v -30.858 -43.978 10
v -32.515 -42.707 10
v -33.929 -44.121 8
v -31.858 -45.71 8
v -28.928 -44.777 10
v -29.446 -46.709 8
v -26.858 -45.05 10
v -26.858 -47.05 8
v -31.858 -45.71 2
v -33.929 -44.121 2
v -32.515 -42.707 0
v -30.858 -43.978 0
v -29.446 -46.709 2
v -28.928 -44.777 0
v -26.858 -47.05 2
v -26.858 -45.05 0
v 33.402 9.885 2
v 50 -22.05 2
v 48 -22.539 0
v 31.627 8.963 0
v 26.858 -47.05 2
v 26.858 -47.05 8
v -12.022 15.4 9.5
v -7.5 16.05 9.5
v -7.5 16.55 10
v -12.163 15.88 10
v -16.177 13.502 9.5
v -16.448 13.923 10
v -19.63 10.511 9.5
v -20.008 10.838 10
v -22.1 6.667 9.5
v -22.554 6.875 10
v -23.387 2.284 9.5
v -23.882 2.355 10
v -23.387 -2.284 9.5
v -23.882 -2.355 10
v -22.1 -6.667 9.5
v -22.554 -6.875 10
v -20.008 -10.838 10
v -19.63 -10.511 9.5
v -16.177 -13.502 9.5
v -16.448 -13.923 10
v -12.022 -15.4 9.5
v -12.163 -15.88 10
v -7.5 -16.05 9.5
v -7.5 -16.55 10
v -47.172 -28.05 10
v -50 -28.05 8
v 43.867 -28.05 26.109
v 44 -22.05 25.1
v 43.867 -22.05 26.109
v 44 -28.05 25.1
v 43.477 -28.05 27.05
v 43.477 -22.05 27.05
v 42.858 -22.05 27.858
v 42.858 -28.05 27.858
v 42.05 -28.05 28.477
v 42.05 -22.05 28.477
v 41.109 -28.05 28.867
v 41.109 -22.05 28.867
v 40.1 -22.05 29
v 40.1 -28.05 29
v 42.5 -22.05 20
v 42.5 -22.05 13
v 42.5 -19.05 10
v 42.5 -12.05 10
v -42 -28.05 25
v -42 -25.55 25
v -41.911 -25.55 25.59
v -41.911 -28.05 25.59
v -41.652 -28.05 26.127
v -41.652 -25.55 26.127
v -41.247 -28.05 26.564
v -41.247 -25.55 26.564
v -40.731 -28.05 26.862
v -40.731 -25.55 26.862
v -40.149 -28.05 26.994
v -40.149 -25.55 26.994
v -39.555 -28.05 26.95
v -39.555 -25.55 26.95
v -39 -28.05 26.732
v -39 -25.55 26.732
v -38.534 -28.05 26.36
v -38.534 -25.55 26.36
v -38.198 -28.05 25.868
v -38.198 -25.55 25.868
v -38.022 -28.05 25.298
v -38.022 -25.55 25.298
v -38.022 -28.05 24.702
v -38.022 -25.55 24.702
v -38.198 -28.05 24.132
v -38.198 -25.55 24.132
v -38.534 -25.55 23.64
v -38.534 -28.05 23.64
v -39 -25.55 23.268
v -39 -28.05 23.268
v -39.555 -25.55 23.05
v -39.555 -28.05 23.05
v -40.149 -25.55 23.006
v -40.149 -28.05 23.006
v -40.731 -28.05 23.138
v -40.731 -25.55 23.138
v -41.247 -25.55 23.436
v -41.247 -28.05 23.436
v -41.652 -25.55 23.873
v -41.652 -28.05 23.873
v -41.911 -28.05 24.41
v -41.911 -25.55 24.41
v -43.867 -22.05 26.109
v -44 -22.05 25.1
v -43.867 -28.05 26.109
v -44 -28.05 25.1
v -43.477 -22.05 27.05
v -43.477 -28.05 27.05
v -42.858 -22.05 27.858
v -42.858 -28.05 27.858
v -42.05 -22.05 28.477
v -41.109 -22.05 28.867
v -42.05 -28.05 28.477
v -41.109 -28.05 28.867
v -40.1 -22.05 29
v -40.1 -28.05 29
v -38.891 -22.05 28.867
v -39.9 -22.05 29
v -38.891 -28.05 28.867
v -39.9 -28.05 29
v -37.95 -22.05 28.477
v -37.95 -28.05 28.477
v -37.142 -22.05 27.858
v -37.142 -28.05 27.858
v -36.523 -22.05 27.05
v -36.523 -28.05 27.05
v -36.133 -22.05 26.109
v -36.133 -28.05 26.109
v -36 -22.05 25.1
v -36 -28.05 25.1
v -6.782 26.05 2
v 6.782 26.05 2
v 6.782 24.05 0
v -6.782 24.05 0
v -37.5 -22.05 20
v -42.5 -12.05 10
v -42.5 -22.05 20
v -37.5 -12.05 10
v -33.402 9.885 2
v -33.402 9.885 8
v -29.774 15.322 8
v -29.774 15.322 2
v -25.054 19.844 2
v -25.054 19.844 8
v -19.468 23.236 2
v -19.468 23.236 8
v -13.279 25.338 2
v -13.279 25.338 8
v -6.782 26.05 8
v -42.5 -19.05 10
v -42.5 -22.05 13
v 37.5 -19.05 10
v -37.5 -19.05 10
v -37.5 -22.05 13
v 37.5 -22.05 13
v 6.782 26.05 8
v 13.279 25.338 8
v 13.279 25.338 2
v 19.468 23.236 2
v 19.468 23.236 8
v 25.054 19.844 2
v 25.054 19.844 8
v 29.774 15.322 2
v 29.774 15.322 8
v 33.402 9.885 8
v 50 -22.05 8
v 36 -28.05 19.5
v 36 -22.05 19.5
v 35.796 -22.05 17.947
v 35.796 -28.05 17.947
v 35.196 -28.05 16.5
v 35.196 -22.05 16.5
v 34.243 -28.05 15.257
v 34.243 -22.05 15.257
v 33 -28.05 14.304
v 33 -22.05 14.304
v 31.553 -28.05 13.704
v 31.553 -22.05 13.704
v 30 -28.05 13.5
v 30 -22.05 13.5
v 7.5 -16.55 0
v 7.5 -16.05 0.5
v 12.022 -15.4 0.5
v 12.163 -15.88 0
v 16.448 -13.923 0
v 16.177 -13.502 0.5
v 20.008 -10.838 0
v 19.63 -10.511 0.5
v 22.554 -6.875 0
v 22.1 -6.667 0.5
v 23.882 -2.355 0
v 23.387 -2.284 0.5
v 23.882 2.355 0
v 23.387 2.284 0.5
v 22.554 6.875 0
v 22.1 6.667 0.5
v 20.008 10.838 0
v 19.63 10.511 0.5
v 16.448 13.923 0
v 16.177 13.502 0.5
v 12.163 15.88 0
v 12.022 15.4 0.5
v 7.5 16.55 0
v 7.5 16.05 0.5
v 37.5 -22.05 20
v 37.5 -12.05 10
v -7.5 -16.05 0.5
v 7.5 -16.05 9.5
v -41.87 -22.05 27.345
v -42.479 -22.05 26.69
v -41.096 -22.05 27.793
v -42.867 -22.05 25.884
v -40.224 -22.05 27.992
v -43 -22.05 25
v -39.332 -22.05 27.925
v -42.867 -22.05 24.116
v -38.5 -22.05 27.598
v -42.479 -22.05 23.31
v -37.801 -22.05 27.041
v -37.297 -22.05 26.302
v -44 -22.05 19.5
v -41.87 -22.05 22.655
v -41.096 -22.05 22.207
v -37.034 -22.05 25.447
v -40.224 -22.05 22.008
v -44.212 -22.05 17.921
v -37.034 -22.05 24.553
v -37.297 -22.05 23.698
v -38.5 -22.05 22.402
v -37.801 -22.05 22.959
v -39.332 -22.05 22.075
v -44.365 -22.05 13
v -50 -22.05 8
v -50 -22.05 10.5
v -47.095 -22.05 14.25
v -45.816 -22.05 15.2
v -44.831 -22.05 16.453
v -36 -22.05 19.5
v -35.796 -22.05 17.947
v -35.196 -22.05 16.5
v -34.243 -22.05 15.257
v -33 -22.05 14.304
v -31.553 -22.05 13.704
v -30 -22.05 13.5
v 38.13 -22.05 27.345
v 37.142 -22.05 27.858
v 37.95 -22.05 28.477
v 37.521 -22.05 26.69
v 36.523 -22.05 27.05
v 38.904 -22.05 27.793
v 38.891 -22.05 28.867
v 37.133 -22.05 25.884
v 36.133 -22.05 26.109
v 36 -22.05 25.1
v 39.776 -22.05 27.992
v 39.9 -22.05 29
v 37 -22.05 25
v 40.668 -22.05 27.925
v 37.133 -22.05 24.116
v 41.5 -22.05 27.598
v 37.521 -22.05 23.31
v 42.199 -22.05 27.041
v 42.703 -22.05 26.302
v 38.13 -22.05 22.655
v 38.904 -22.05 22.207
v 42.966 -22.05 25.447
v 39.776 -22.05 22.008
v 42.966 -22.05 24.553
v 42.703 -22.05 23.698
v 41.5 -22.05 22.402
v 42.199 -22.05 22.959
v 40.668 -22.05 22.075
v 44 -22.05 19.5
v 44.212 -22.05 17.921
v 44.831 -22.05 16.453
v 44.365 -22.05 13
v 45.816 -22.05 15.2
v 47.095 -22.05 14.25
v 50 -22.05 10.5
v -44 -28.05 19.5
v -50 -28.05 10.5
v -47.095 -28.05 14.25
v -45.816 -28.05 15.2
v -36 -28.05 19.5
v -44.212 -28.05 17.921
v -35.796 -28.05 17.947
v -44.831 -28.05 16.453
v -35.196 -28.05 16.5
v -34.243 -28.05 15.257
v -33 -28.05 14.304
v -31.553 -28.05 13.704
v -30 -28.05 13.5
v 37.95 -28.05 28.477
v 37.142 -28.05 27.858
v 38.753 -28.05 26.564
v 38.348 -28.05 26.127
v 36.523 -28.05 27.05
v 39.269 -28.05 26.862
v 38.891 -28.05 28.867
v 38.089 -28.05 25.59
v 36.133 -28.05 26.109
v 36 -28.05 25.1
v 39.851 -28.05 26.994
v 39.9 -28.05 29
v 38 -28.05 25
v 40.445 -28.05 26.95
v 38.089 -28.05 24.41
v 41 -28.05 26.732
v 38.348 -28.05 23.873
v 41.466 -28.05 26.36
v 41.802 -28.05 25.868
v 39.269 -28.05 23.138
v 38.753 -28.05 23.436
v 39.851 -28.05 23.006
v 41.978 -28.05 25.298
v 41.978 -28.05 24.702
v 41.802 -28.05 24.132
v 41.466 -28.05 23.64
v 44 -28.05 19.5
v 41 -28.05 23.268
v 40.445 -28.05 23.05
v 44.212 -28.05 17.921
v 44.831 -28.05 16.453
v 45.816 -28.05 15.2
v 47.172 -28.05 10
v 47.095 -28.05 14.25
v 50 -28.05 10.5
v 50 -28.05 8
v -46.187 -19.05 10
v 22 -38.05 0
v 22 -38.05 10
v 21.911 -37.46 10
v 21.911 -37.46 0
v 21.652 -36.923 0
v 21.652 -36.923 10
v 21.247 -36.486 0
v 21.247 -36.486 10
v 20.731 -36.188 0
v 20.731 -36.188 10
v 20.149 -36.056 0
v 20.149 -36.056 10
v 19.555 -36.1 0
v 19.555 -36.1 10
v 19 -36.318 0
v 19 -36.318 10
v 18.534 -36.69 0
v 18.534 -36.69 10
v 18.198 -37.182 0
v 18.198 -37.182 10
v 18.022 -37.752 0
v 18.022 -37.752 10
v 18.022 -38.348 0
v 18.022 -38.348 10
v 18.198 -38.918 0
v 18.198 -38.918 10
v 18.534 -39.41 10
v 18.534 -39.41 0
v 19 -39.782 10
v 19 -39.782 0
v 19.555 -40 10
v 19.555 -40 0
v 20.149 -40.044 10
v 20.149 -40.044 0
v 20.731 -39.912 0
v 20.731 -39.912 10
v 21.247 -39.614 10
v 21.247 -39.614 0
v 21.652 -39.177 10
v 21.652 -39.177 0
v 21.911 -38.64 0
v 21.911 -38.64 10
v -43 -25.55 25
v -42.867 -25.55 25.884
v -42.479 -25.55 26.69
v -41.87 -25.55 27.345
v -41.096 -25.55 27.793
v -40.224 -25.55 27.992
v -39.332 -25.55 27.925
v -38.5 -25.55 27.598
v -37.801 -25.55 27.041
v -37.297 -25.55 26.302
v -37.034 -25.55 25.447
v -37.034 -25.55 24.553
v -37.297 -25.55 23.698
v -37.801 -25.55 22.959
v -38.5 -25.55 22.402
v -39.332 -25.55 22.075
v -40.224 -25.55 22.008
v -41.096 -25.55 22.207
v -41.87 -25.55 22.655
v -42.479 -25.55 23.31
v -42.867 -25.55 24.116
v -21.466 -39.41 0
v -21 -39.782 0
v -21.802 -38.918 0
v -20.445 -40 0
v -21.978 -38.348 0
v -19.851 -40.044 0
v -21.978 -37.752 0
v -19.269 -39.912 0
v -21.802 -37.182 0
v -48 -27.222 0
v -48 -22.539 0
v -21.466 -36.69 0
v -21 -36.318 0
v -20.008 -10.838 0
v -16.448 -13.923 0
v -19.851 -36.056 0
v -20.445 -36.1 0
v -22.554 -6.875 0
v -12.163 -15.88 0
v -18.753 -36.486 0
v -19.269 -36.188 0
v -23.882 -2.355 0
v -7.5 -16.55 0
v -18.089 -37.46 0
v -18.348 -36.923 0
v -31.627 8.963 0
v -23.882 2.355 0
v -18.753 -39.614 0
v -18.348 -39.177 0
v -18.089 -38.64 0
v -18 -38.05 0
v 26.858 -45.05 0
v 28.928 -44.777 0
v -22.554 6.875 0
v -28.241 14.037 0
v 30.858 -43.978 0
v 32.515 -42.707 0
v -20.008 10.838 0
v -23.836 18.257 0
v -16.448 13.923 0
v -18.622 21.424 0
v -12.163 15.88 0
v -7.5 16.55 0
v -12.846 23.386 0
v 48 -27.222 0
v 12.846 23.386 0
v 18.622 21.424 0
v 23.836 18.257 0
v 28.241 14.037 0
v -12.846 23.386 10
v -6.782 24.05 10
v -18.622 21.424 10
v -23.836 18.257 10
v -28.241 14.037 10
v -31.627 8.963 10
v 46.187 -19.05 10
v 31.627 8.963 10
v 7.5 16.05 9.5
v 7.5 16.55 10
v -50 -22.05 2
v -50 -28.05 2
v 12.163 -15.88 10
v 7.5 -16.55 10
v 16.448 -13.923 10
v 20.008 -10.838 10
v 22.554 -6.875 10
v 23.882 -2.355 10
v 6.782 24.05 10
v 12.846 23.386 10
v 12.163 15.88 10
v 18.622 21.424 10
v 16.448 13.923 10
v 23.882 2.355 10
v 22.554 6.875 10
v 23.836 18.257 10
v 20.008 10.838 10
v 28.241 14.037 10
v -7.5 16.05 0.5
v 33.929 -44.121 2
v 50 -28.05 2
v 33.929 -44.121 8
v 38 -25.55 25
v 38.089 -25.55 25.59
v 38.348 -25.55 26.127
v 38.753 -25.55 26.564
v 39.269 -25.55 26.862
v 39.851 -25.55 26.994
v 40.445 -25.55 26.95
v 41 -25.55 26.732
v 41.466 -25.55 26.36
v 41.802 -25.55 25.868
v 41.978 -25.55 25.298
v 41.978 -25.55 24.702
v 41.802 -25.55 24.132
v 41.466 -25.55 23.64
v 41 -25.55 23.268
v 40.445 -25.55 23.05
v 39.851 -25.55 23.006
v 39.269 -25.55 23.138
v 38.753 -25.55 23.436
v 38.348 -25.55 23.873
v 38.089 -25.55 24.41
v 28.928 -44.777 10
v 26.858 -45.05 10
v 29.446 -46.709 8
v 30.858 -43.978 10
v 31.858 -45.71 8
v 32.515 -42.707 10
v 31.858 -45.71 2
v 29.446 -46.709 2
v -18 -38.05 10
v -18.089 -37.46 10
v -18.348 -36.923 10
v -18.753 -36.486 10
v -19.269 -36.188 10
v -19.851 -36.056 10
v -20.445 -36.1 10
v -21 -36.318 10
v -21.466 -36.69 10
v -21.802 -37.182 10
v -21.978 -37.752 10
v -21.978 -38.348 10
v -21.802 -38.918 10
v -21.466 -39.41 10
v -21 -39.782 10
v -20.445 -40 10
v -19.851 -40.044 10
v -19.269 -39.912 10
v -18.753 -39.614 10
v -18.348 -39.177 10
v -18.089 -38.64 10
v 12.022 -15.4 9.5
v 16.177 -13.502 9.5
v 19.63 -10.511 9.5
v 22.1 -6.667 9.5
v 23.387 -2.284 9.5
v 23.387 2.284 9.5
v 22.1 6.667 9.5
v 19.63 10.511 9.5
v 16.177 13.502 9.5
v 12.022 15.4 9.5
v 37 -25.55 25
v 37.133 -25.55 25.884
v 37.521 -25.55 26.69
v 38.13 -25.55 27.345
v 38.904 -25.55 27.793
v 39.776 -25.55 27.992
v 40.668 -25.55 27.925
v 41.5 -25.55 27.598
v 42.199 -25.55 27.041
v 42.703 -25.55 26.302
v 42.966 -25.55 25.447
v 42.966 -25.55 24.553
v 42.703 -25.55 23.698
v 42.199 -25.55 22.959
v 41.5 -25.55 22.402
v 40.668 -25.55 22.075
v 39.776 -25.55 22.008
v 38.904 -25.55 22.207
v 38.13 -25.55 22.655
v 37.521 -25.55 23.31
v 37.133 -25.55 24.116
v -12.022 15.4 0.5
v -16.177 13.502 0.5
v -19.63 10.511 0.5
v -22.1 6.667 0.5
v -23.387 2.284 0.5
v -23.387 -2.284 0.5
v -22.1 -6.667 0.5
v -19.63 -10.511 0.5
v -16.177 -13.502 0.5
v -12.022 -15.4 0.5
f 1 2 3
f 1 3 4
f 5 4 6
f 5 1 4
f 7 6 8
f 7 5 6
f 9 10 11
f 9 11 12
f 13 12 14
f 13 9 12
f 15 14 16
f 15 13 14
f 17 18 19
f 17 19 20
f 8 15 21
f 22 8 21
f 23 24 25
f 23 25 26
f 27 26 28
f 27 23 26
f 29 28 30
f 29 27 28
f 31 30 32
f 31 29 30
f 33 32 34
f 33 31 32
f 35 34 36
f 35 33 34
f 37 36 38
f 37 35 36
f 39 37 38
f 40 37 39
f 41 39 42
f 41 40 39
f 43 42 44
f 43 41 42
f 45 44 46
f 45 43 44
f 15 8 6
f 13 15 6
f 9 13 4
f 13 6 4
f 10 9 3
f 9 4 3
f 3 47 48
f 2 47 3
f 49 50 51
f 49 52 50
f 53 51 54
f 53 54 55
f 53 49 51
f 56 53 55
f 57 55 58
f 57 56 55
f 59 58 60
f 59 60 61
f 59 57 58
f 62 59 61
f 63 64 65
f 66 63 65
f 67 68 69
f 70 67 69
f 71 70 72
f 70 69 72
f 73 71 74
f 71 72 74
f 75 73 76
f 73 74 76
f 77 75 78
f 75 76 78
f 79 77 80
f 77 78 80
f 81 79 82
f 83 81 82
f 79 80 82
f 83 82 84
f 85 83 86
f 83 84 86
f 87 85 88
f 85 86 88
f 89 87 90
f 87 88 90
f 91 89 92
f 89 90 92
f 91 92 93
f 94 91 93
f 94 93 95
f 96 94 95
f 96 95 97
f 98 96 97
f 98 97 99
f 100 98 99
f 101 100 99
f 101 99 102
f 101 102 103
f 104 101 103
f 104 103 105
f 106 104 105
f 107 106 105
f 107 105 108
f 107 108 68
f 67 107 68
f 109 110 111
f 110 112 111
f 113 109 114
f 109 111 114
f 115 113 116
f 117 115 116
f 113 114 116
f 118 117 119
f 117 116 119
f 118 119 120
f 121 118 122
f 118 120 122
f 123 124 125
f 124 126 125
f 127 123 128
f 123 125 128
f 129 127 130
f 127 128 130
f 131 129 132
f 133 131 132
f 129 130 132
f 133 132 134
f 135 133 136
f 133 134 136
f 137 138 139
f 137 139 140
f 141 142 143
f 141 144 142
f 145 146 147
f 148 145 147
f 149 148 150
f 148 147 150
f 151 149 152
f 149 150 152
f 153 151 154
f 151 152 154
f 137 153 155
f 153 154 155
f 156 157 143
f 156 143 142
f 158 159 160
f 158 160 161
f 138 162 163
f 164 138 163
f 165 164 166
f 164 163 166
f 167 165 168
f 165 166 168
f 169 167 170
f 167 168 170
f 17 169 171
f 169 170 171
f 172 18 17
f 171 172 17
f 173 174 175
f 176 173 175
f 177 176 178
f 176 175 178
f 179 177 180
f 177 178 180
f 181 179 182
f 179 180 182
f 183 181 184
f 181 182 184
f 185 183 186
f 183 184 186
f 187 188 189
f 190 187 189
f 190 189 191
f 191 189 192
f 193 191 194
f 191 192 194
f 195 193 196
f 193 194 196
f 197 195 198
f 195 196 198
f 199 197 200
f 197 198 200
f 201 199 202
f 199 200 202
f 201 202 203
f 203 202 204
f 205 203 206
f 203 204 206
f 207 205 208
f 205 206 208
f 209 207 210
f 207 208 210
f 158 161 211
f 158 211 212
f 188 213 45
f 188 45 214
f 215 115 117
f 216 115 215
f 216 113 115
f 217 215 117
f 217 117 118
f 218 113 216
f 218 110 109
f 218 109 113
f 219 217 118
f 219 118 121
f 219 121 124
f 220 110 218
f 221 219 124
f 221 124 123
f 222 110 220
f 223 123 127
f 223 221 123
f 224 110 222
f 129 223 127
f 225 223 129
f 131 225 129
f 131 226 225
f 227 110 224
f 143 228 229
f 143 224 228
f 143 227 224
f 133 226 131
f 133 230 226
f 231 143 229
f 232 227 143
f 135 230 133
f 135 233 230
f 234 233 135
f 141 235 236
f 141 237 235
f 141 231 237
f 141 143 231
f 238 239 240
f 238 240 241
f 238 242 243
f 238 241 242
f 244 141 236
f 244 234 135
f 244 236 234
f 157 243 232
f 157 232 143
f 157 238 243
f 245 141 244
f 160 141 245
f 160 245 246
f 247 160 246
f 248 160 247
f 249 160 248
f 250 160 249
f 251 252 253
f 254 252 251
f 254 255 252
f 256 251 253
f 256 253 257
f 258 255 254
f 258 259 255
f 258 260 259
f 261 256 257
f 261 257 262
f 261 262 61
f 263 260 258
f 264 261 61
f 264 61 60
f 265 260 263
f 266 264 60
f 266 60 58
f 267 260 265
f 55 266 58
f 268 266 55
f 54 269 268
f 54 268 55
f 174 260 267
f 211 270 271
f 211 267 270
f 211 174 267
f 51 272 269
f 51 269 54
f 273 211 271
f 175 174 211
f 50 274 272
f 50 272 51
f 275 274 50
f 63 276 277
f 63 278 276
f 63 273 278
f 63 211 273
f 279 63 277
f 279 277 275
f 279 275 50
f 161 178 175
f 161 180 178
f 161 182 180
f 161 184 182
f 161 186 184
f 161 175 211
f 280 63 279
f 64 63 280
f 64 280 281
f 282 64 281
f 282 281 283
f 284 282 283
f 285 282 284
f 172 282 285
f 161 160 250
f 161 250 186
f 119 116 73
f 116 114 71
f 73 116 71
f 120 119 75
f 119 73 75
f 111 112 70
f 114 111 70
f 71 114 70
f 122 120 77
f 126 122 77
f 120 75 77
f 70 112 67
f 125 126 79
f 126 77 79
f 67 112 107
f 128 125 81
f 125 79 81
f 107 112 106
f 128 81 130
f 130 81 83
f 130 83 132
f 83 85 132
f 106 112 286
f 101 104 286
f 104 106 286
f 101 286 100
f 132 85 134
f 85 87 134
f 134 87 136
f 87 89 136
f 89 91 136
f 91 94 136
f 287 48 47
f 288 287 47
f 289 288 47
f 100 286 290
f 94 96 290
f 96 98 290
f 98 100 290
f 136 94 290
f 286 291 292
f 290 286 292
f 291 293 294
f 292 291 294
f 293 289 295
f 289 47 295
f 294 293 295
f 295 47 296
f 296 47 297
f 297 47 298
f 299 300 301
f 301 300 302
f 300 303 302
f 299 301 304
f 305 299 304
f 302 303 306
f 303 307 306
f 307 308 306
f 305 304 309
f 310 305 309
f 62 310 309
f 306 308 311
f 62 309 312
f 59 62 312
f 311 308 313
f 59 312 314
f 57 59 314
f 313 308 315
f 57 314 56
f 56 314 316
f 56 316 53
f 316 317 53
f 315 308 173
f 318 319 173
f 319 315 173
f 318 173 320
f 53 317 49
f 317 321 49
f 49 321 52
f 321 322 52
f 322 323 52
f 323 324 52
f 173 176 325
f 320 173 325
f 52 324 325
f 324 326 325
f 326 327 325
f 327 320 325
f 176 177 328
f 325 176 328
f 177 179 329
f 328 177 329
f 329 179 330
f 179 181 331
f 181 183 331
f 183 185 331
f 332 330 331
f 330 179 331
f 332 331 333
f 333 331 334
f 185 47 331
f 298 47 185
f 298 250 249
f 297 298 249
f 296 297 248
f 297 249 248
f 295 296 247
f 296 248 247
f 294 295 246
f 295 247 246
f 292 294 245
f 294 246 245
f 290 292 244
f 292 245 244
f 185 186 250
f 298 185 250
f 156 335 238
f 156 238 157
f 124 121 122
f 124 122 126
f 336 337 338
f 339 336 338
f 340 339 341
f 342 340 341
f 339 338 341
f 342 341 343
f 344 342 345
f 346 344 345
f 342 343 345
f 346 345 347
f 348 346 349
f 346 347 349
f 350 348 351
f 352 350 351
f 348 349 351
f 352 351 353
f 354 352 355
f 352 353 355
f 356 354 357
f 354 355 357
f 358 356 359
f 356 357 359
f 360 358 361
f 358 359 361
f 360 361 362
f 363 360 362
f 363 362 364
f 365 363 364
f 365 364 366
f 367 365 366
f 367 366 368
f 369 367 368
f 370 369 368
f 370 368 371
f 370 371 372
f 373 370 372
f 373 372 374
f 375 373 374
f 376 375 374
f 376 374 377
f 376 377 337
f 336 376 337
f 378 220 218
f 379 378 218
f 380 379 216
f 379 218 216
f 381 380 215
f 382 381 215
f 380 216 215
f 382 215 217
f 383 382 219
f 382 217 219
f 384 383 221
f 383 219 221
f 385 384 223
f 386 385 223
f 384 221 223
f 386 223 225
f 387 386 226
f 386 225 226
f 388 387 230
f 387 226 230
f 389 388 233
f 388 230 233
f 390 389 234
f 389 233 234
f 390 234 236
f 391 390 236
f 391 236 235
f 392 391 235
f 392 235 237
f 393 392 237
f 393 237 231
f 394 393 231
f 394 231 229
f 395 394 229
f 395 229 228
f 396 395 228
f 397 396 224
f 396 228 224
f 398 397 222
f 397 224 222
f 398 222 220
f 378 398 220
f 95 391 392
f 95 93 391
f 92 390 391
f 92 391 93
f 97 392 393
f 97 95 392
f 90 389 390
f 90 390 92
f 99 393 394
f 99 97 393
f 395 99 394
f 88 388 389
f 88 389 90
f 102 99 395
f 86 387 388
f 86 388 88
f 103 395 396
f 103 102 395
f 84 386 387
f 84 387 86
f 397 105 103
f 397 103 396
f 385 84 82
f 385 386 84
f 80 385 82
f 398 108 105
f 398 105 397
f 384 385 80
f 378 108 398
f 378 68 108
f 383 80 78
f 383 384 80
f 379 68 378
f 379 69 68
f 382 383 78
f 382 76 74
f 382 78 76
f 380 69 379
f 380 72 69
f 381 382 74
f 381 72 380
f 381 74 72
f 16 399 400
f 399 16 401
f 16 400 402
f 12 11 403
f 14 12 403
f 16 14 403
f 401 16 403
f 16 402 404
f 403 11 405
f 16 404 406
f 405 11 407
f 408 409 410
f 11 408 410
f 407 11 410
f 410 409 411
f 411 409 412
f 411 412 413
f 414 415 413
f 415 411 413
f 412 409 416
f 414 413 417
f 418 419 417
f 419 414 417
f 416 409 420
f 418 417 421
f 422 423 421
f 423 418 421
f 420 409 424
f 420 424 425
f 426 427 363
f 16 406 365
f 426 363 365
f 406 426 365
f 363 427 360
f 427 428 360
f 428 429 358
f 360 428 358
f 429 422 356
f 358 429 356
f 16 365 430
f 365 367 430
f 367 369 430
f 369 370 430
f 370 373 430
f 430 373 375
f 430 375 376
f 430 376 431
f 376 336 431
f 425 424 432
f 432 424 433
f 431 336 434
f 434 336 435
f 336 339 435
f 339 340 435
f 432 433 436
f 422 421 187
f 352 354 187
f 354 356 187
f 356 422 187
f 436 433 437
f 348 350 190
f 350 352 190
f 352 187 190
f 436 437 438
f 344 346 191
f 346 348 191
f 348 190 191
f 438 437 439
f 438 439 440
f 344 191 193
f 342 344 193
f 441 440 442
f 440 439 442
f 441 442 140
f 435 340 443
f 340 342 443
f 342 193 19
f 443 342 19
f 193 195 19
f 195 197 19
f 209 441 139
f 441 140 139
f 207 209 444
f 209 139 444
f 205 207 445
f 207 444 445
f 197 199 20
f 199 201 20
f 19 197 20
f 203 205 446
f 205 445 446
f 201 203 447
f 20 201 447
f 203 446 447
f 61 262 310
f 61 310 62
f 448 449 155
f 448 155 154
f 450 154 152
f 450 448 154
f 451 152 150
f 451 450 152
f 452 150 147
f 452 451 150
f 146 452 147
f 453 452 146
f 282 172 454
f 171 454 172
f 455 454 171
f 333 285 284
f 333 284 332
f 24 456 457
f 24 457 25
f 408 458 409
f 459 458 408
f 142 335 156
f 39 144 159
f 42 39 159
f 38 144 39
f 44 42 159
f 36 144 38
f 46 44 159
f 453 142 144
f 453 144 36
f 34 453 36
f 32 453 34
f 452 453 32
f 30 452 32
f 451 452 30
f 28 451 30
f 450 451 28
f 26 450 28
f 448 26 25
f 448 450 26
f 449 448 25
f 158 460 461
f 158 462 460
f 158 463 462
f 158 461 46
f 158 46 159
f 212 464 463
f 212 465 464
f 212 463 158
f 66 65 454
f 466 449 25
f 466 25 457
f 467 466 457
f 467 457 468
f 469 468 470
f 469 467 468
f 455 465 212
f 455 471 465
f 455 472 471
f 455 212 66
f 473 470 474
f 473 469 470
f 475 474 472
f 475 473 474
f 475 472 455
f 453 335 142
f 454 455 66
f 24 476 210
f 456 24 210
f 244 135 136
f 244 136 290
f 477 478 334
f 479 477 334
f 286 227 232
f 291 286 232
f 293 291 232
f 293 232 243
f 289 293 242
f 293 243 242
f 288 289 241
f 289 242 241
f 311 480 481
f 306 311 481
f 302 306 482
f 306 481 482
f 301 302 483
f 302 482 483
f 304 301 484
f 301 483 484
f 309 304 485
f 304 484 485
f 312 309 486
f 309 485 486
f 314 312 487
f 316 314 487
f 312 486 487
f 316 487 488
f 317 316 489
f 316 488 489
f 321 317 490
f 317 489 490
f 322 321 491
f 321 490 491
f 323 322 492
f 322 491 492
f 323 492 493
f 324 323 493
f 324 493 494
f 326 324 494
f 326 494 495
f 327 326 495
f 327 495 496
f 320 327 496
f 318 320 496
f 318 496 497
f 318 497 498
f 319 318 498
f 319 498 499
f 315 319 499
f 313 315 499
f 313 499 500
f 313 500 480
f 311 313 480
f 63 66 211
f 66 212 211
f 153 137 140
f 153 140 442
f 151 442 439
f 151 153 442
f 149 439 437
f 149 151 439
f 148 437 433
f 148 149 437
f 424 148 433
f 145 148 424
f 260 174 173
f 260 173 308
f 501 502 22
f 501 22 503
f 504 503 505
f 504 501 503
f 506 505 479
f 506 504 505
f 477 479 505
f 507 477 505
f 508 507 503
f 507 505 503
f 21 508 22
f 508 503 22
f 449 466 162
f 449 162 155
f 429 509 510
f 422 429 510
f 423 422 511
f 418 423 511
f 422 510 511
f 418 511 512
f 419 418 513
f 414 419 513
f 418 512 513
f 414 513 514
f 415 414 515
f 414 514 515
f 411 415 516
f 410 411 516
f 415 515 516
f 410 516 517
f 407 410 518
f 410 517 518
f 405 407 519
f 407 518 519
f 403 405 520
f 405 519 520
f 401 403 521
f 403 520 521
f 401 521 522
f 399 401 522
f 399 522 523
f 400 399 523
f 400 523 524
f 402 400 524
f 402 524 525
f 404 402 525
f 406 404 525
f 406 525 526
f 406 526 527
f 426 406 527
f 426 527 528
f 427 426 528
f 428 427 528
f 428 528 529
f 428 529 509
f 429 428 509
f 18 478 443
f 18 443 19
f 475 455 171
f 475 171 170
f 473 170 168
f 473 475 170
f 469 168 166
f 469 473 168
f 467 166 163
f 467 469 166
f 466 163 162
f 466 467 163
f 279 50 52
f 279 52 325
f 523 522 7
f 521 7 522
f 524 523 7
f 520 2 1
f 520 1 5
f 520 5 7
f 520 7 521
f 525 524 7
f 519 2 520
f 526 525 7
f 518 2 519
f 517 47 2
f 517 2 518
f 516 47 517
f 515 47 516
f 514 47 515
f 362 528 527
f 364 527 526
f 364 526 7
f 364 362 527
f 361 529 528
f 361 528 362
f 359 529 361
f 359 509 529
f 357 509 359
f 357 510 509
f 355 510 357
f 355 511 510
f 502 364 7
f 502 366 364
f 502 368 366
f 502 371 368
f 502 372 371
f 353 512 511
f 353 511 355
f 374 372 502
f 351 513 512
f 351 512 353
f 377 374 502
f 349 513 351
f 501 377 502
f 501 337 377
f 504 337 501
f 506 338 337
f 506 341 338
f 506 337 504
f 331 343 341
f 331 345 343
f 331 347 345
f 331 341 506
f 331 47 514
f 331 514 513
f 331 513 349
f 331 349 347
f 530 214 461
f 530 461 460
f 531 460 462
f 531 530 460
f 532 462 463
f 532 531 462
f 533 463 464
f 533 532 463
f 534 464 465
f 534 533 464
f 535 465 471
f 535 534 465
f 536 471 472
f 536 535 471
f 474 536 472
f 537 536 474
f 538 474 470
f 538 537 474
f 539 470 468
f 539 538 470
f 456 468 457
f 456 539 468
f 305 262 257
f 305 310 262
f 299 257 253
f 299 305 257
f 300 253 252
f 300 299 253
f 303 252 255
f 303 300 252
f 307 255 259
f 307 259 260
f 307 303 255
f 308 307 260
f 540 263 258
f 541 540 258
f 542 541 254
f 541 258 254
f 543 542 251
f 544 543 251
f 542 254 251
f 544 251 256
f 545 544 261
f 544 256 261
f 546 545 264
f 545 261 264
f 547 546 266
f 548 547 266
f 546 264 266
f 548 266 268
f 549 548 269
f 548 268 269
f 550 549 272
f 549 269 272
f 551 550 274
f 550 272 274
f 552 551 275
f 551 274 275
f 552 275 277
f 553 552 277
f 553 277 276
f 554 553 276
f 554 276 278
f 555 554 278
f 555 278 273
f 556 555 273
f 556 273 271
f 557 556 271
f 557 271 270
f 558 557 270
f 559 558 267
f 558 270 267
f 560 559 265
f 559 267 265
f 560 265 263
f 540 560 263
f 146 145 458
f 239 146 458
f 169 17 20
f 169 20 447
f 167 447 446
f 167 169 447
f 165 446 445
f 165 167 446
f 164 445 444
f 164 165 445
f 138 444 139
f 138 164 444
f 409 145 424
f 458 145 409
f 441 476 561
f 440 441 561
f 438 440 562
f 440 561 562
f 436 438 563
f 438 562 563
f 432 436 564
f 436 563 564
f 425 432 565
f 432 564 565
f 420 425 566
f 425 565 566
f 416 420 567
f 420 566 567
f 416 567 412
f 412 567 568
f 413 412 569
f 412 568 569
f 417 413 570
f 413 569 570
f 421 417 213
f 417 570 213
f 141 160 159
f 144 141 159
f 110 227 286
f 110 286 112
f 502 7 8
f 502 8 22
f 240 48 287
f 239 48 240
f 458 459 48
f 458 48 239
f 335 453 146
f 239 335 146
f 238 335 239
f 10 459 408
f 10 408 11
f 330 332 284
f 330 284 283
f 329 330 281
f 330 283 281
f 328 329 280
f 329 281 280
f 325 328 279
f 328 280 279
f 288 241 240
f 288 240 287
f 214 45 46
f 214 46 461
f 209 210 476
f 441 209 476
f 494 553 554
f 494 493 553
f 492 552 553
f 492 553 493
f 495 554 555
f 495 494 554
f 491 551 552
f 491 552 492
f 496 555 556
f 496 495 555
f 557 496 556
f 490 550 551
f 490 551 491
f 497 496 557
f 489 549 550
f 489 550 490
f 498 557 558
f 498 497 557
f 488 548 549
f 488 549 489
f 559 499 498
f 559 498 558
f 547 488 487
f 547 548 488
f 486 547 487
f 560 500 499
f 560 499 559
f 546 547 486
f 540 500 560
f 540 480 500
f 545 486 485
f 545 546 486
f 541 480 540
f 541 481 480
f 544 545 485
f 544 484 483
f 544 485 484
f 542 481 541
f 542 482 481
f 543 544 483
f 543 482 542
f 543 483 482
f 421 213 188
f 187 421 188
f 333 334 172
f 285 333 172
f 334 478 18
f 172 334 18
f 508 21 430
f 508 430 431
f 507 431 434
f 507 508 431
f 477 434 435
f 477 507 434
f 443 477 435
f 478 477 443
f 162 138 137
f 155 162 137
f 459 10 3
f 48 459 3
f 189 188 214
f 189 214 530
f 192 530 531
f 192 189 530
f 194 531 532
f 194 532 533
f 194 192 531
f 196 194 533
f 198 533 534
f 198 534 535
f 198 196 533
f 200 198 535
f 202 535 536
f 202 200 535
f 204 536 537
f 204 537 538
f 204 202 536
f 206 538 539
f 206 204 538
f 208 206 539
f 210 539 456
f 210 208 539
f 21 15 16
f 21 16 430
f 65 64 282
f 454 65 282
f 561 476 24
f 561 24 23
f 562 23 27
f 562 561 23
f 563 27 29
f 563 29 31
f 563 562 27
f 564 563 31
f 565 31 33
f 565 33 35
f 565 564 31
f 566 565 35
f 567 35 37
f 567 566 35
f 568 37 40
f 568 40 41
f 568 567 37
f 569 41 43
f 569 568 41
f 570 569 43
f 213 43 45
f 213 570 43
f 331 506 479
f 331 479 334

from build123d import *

# Parameters (mm, degrees)
PAD_DEPTH       = 10
SKETCH001_W     = 100
SKETCH001_H     = 6
PAD001_DEPTH    = 19
POCKET_DEPTH    = 25.001
SKETCH003_W     = 59.99999
SKETCH003_H     = 15.5
POCKET001_DEPTH = 25.001
SKETCH004_R     = 2
POCKET002_DEPTH = 25.001
SKETCH005_R     = 3
POCKET003_DEPTH = 3.5
FILLET_R        = 3.9
FILLET001_R     = 30
SKETCH006_R     = 2
POCKET004_DEPTH = 10.001
CHAMFER_SIZE    = 19
FILLET002_R     = 10
CHAMFER001_SIZE = 2
CHAMFER002_SIZE = 3
CHAMFER003_SIZE = 3
CHAMFER004_SIZE = 0.5
PAD002_DEPTH    = 2.5


with BuildPart() as part:
    # Sketch → Pad (new body)
    with BuildSketch(Plane.XY):
        Polygon((50, -22.05), (25, 26.05), (-25, 26.05), (-50, -22.05), (-50, -47.05), (50, -47.05), align=None)
        with BuildLine():
            ThreePointArc((-7.5, 16.05), (-23.55, 0), (-7.5, -16.05))
            Line((-7.5, -16.05), (7.5, -16.05))
            ThreePointArc((7.5, -16.05), (23.55, 0), (7.5, 16.05))
            Line((-7.5, 16.05), (7.5, 16.05))
        make_face(mode=Mode.SUBTRACT)
    extrude(amount=PAD_DEPTH)

    # Sketch001 (on Face12 of Pad) → Pad001 (join)
    with BuildSketch(Plane.XY.offset(10)):
        with Locations((0, -25.05)):
            Rectangle(SKETCH001_W, SKETCH001_H)
    extrude(amount=PAD001_DEPTH)

    # Sketch002 (on Face12 of Pad001) → Pocket (cut, through all)
    with BuildSketch(Plane(origin=(0, -22.05, 0), x_dir=(-1, 0, 0), z_dir=(0, 1, 0))):
        with BuildLine():
            ThreePointArc((-50, 13.5), (-45.757359, 15.257359), (-44, 19.5))
            Line((-44, 29), (-44, 19.5))
            Line((-50, 29), (-44, 29))
            Line((-50, 13.5), (-50, 29))
        make_face()
        with BuildLine():
            ThreePointArc((-36, 19.5), (-30, 13.5), (-24, 19.5))
            Line((-24, 29), (-24, 19.5))
            Line((-36, 29), (-24, 29))
            Line((-36, 19.5), (-36, 29))
        make_face()
        with BuildLine():
            ThreePointArc((-16, 19.5), (-10, 13.5), (-4, 19.5))
            Line((-4, 29), (-4, 19.5))
            Line((-16, 29), (-4, 29))
            Line((-16, 19.5), (-16, 29))
        make_face()
        with BuildLine():
            ThreePointArc((4, 19.5), (10, 13.5), (16, 19.5))
            Line((16, 29), (16, 19.5))
            Line((4, 29), (16, 29))
            Line((4, 19.5), (4, 29))
        make_face()
        with BuildLine():
            ThreePointArc((24, 19.5), (30, 13.5), (36, 19.5))
            Line((36, 29), (36, 19.5))
            Line((24, 29), (36, 29))
            Line((24, 19.5), (24, 29))
        make_face()
        with BuildLine():
            ThreePointArc((44, 19.5), (45.757359, 15.257359), (50, 13.5))
            Line((50, 29), (50, 13.5))
            Line((44, 29), (50, 29))
            Line((44, 19.5), (44, 29))
        make_face()
    extrude(amount=-POCKET_DEPTH, mode=Mode.SUBTRACT)

    # Sketch003 (on Face10 of Pocket) → Pocket001 (cut, through all)
    with BuildSketch(Plane(origin=(0, -22.05, 0), x_dir=(-1, 0, 0), z_dir=(0, 1, 0))):
        with Locations((-5e-06, 21.25)):
            Rectangle(SKETCH003_W, SKETCH003_H)
    extrude(amount=-POCKET001_DEPTH, mode=Mode.SUBTRACT)

    # Sketch004 (on Face10 of Pocket001) → Pocket002 (cut, through all)
    with BuildSketch(Plane(origin=(0, -22.05, 0), x_dir=(-1, 0, 0), z_dir=(0, 1, 0))):
        with Locations((-40, 25)):
            Circle(SKETCH004_R)
        with Locations((40, 25)):
            Circle(SKETCH004_R)
    extrude(amount=-POCKET002_DEPTH, mode=Mode.SUBTRACT)

    # Sketch005 (on Face10 of Pocket002) → Pocket003 (cut)
    with BuildSketch(Plane(origin=(0, -22.05, 0), x_dir=(-1, 0, 0), z_dir=(0, 1, 0))):
        with Locations((-40, 25)):
            Circle(SKETCH005_R)
        with Locations((40, 25)):
            Circle(SKETCH005_R)
    extrude(amount=-POCKET003_DEPTH, mode=Mode.SUBTRACT)

    # Fillet
    fillet_edges = [part.edges().sort_by_distance(p)[0] for p in [
        (36, -25.05, 29),
        (44, -25.05, 29),
        (-36, -25.05, 29),
        (-44, -25.05, 29),
    ]]
    fillet(fillet_edges, radius=FILLET_R)

    # Fillet001
    fillet001_edges = [part.edges().sort_by_distance(p)[0] for p in [
        (25, 26.05, 5),
        (-25, 26.05, 5),
    ]]
    fillet(fillet001_edges, radius=FILLET001_R)

    # Sketch006 (on Face15 of Fillet001) → Pocket004 (cut, through all)
    with BuildSketch(Plane.XY.offset(10)):
        with Locations((-20, -38.05)):
            Circle(SKETCH006_R)
        with Locations((20, -38.05)):
            Circle(SKETCH006_R)
    extrude(amount=-POCKET004_DEPTH, mode=Mode.SUBTRACT)

    # Chamfer
    chamfer_edges = [part.edges().sort_by_distance(p)[0] for p in [
        (-50, -47.05, 5),
        (50, -47.05, 5),
    ]]
    chamfer(chamfer_edges, length=CHAMFER_SIZE)

    # Fillet002
    fillet002_edges = [part.edges().sort_by_distance(p)[0] for p in [
        (-31, -47.05, 5),
        (31, -47.05, 5),
    ]]
    fillet(fillet002_edges, radius=FILLET002_R)

    # Chamfer001
    chamfer001_edges = [part.edges().sort_by_distance(p)[0] for p in [
        (-41.700791, -6.082323, 0),
        (-50, -25.05, 0),
        (-41.964466, -36.085534, 0),
        (50, -25.05, 0),
        (-41.700791, -6.082323, 10),
        (-41.964466, -36.085534, 10),
    ]]
    chamfer(chamfer001_edges, length=CHAMFER001_SIZE)

    # Chamfer002
    chamfer002_edges = [part.edges().sort_by_distance(p)[0] for p in [
        (-50, -25.05, 13.5),
        (50, -25.05, 13.5),
    ]]
    chamfer(chamfer002_edges, length=CHAMFER002_SIZE)

    # Chamfer003
    chamfer003_edges = [part.edges().sort_by_distance(p)[0] for p in [
        (0, -22.05, 10),
    ]]
    chamfer(chamfer003_edges, length=CHAMFER003_SIZE)

    # Chamfer004
    chamfer004_edges = [part.edges().sort_by_distance(p)[0] for p in [
        (-23.55, 0, 0),
        (-23.55, 0, 10),
    ]]
    chamfer(chamfer004_edges, length=CHAMFER004_SIZE)

    # Sketch007 → Pad002 (join, symmetric)
    with BuildSketch(Plane.YZ.offset(-40)):
        Polygon((-22.05, 20), (-22.05, 10), (-12.05, 10), align=None)
    pad002 = extrude(amount=PAD002_DEPTH, both=True)

    # Mirrored: Pad002 across YZ
    add(pad002.mirror(Plane.YZ))


solid = part.part
